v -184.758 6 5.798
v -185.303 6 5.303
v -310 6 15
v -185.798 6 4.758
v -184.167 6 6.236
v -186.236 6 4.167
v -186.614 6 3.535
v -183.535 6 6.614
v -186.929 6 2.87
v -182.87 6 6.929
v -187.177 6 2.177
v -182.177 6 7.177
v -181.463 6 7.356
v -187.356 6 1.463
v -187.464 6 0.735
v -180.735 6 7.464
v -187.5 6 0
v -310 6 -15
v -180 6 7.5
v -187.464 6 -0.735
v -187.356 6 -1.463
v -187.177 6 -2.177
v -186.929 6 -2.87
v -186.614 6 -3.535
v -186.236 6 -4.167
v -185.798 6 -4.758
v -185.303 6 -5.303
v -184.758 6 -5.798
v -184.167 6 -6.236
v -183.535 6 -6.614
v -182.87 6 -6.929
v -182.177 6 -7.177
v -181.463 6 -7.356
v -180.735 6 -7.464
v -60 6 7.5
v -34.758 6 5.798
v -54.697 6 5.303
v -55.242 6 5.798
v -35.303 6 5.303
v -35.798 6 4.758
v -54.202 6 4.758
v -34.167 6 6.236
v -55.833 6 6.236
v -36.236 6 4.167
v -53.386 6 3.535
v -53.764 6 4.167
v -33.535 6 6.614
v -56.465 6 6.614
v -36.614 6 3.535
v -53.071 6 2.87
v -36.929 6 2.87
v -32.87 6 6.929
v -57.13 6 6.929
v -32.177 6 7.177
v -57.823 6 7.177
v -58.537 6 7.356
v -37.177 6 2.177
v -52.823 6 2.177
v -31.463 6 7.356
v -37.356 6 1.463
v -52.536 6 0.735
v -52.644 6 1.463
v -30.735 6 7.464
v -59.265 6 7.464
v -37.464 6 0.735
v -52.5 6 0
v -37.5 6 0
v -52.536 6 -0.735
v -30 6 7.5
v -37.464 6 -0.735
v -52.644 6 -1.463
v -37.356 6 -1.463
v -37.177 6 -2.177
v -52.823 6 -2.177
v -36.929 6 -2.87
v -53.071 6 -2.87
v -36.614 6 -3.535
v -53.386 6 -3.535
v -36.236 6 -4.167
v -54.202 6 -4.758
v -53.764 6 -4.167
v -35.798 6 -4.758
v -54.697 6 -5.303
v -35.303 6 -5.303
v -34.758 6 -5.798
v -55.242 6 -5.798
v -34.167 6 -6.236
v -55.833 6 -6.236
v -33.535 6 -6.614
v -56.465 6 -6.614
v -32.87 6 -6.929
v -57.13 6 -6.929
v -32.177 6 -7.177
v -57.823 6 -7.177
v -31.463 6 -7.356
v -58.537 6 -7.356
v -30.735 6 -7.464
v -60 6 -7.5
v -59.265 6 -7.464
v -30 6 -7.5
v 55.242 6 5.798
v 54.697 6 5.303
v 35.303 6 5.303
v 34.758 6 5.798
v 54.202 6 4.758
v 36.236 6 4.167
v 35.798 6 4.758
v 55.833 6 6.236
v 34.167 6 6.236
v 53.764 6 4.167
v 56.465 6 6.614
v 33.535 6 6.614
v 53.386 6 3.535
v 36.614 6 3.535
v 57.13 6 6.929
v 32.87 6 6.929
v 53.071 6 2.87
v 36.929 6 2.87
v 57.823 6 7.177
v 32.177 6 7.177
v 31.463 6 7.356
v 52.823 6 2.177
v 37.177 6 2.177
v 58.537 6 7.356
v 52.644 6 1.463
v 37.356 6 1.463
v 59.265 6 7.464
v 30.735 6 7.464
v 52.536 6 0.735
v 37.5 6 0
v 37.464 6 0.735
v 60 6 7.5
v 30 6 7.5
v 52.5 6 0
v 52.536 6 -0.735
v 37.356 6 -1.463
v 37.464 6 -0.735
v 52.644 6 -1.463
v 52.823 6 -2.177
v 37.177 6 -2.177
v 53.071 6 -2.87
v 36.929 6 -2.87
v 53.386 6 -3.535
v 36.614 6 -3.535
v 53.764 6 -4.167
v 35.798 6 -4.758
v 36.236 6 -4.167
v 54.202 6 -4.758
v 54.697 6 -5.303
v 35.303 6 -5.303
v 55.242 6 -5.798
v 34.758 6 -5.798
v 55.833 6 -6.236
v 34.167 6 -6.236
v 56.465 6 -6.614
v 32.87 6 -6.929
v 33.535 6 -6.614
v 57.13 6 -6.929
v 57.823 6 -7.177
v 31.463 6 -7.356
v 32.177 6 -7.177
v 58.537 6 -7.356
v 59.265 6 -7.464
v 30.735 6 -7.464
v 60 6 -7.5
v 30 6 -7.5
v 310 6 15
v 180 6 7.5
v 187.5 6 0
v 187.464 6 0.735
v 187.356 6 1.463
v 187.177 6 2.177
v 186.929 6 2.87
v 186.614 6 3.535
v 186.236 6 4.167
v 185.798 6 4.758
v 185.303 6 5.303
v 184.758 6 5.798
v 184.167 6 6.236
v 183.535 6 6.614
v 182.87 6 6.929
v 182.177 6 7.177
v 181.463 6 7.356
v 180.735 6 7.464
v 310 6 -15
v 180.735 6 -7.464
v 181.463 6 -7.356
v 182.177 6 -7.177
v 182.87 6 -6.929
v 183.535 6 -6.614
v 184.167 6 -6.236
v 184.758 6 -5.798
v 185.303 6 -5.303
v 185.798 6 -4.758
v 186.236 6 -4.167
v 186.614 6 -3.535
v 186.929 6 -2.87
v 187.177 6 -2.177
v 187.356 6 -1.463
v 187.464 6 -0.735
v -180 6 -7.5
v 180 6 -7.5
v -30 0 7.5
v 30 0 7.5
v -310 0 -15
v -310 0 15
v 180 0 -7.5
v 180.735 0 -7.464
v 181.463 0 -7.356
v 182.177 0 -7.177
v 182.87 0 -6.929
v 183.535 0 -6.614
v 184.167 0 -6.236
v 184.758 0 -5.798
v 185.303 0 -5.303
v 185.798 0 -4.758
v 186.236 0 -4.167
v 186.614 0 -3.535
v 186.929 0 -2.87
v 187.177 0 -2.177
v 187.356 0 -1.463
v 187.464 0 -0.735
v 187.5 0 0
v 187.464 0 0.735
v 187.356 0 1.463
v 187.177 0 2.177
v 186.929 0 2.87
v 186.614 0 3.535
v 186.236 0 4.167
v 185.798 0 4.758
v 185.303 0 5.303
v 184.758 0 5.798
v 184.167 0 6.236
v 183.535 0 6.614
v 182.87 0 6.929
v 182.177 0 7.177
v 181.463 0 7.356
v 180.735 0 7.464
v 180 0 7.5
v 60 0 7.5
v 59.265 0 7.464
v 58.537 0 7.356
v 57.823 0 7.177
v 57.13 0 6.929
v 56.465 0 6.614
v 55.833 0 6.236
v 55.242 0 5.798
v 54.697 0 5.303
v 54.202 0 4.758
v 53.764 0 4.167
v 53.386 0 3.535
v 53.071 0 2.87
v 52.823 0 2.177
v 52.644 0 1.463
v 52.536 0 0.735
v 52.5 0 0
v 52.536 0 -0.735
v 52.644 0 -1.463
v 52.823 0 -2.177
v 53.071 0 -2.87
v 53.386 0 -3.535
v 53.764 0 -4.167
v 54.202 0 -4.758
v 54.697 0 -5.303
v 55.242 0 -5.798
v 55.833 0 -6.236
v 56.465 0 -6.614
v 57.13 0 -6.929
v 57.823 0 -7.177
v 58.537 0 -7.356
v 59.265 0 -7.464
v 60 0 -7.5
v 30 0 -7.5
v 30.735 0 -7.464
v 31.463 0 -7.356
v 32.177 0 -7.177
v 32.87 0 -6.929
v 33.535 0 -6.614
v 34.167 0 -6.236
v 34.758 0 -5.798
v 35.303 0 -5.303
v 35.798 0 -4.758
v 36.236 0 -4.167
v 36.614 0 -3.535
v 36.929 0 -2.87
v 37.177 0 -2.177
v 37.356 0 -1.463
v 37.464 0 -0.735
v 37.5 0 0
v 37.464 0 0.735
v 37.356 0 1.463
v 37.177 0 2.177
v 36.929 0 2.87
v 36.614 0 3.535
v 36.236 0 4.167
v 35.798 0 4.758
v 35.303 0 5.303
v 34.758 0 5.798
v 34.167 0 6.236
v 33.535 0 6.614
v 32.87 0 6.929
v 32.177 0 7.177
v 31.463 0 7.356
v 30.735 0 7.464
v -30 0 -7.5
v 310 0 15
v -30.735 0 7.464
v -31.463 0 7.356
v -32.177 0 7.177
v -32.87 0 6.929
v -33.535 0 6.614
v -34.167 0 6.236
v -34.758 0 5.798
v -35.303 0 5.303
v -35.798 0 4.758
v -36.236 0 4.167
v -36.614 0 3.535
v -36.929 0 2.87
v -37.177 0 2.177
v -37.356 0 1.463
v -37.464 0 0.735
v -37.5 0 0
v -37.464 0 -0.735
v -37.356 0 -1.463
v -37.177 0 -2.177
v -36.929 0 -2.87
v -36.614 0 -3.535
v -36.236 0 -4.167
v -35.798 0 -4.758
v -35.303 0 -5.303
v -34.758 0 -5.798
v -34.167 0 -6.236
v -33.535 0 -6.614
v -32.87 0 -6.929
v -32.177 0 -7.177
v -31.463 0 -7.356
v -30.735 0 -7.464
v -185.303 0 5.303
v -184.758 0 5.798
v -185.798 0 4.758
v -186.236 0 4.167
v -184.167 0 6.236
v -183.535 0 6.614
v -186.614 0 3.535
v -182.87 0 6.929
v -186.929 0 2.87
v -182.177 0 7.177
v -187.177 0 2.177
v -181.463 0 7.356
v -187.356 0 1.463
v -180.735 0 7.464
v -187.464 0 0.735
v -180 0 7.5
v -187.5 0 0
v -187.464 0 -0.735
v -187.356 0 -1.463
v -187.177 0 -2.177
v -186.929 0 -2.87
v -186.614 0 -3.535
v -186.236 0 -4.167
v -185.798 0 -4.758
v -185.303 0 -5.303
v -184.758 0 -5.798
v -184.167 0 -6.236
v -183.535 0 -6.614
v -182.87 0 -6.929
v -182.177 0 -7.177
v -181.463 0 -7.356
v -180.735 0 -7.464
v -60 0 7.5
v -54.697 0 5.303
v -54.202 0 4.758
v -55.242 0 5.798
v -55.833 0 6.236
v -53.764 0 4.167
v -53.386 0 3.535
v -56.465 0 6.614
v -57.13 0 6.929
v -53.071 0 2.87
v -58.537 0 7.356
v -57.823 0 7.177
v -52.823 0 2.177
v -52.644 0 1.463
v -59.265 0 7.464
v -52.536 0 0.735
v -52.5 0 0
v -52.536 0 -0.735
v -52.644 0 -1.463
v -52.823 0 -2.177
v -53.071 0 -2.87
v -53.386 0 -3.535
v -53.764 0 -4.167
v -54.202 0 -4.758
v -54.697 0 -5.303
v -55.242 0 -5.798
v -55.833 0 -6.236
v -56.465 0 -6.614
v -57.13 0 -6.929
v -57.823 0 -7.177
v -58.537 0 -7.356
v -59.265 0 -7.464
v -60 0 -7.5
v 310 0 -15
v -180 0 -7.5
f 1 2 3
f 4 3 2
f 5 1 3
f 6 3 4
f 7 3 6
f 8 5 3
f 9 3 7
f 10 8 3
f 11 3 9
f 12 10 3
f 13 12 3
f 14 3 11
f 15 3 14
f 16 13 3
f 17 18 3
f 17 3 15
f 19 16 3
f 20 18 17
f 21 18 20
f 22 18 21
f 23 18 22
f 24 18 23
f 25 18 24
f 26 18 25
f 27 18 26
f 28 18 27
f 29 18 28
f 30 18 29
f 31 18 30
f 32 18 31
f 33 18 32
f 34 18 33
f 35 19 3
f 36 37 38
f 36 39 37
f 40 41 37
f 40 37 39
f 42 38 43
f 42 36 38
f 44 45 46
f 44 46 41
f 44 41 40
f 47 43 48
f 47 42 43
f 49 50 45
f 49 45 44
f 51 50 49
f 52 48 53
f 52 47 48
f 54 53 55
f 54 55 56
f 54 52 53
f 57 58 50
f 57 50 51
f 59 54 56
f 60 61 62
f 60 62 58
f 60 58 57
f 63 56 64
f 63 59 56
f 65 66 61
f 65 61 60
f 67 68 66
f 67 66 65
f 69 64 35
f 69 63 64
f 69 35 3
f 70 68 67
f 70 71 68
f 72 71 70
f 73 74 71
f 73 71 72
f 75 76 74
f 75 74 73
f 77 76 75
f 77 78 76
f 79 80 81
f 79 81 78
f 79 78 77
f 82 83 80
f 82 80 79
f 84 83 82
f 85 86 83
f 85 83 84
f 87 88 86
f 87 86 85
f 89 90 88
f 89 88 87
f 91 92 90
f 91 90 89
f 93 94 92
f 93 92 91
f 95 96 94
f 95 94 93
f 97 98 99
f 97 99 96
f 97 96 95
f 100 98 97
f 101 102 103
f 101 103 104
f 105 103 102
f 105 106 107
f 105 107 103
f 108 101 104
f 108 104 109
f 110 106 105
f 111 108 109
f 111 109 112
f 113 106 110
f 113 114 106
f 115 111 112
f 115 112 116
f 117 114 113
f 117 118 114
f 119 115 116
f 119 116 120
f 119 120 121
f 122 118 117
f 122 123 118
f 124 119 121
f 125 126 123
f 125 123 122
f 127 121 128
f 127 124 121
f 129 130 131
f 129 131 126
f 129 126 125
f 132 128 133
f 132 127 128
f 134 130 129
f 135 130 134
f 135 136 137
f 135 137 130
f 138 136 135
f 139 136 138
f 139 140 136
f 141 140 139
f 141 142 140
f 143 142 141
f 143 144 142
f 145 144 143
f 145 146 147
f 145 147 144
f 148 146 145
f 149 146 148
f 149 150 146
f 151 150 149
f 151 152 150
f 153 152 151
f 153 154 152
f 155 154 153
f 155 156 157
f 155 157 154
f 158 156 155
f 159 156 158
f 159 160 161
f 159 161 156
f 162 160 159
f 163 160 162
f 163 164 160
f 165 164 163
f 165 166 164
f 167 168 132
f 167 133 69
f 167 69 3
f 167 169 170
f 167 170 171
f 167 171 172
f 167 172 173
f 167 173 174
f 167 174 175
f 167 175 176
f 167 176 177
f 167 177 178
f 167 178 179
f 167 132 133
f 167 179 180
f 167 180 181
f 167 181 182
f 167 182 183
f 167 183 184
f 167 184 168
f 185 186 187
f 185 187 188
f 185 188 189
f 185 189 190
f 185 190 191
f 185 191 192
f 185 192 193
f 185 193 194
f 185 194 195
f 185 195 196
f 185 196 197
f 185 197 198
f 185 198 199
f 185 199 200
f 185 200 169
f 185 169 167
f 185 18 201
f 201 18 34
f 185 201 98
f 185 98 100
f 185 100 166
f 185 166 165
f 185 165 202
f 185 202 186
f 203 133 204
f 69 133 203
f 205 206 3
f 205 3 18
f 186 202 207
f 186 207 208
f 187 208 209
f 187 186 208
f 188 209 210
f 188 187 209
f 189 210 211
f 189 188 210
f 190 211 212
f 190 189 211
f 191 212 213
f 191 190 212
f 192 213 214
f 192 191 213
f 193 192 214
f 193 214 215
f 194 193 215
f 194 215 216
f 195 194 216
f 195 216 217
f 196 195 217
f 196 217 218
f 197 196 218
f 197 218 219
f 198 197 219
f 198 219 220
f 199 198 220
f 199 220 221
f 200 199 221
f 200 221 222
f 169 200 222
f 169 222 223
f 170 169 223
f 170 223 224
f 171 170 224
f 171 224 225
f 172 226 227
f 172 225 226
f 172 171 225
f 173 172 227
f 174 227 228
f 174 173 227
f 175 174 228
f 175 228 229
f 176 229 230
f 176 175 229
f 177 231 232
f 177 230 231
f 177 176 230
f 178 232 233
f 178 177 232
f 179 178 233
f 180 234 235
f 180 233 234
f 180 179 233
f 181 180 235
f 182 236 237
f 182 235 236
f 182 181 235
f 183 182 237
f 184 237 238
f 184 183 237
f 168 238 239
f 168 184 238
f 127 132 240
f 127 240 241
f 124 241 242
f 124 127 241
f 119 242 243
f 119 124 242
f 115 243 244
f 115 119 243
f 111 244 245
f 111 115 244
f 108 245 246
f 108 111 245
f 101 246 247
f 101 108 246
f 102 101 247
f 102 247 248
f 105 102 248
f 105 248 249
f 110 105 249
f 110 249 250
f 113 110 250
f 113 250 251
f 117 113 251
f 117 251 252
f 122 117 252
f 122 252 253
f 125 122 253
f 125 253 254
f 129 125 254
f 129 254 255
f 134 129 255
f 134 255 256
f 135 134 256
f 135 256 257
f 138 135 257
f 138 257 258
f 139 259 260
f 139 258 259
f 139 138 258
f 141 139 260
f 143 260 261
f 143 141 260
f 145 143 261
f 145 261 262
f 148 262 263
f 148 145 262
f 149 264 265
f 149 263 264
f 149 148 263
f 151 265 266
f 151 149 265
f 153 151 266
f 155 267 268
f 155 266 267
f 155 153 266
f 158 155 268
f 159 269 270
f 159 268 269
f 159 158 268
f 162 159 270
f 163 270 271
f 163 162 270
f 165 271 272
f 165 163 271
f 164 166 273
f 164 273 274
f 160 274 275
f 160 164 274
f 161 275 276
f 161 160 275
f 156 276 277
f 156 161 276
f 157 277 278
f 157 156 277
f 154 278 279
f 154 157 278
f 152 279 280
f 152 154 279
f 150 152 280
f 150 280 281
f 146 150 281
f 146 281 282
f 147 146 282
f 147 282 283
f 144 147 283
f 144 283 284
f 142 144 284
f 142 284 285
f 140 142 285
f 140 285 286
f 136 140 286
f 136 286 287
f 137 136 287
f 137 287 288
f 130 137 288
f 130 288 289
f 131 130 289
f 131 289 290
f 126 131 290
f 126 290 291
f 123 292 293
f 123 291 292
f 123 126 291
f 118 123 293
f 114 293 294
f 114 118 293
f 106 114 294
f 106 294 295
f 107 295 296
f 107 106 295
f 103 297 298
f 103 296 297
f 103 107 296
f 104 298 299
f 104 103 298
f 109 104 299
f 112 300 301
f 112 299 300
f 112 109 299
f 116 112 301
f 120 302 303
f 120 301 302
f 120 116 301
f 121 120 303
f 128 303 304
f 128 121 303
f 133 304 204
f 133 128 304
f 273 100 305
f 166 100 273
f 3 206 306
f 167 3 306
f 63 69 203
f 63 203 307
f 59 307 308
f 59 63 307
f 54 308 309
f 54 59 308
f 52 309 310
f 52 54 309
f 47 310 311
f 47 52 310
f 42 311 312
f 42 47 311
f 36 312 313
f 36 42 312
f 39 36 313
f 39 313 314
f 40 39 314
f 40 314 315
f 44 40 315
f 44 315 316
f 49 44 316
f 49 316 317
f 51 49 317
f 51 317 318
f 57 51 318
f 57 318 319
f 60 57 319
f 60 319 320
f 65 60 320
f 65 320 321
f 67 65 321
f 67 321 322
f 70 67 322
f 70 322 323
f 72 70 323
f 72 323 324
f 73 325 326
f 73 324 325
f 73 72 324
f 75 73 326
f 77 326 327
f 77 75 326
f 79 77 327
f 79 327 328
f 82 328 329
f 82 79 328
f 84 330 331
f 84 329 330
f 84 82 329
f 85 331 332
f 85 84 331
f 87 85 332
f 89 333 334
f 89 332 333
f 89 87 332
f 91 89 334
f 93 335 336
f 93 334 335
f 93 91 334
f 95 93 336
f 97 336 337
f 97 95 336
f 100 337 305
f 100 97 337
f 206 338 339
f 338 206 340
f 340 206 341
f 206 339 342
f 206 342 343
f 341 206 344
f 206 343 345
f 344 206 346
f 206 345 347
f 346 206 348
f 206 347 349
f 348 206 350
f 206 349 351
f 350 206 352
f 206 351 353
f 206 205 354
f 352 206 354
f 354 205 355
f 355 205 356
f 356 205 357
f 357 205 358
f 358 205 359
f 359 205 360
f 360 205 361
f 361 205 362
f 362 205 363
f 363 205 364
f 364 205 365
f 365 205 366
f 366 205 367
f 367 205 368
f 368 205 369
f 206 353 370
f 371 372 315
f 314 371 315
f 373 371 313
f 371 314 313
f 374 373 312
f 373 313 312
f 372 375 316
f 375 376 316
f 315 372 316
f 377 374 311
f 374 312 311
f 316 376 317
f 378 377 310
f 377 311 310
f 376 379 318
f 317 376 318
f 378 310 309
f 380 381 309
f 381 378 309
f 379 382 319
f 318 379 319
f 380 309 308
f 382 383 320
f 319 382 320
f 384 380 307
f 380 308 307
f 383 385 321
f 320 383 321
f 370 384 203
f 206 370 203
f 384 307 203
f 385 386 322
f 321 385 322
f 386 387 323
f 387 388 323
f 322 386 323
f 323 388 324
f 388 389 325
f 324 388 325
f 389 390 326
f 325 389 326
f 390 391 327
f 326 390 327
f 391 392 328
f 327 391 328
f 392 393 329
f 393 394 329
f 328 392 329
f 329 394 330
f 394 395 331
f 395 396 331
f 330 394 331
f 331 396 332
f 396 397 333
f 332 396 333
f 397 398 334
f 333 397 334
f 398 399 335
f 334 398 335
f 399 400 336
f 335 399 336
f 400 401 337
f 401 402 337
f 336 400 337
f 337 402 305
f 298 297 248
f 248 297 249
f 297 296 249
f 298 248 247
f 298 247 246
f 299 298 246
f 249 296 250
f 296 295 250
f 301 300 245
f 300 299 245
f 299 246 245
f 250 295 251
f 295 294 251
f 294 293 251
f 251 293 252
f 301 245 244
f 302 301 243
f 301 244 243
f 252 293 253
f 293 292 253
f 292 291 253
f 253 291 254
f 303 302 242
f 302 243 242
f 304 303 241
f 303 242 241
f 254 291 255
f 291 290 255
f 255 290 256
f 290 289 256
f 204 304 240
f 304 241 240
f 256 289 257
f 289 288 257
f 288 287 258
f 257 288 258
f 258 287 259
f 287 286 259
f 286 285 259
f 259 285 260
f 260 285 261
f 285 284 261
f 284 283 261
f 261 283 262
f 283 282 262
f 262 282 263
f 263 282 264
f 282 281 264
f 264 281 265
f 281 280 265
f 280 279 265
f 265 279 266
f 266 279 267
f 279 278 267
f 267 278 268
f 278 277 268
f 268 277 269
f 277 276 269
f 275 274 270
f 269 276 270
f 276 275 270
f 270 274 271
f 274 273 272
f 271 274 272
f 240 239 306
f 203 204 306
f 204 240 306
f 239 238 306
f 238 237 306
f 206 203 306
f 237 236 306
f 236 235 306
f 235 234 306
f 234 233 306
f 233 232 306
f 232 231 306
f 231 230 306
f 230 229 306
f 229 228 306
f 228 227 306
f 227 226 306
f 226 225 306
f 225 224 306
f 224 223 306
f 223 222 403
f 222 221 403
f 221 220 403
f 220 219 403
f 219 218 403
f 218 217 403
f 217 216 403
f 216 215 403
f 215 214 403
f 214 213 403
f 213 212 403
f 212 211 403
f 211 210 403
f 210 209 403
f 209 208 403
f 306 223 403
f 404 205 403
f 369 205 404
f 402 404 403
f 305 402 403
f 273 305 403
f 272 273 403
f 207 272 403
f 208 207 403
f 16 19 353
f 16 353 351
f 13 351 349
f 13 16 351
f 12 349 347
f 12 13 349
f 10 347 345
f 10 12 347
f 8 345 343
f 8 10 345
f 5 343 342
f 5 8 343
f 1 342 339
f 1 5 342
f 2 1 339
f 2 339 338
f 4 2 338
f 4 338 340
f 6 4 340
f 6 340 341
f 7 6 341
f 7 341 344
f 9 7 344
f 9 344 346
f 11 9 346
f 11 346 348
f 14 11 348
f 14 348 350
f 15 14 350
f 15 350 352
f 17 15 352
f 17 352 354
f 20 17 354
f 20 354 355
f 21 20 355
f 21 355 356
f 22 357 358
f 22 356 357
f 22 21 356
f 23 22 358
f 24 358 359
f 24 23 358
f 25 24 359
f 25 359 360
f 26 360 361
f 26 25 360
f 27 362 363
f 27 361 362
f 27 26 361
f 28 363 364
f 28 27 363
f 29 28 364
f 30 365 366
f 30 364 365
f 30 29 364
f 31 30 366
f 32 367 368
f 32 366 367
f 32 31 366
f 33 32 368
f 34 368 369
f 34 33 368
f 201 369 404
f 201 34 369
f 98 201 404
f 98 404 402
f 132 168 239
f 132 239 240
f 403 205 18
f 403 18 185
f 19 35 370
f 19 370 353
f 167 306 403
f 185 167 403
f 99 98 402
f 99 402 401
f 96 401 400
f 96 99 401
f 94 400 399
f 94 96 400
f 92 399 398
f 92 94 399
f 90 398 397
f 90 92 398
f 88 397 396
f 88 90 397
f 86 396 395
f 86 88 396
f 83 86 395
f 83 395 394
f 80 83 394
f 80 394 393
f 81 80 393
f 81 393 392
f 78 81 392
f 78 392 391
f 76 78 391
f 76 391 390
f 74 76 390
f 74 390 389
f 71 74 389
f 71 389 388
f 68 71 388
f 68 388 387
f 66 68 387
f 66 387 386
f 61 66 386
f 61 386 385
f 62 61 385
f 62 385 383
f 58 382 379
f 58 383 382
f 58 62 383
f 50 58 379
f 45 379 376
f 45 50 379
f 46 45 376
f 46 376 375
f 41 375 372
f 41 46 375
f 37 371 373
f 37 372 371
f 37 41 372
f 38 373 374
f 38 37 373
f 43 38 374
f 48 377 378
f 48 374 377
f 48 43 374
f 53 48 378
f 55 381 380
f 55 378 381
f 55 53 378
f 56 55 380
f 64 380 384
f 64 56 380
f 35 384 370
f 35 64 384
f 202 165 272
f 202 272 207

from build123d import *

# Parameters (mm, degrees)
SKETCH_1_W          = 620
SKETCH_1_H          = 30
EXTRUDE_1_DEPTH     = 6
CUT_EXTRUDE_1_DEPTH = 311.420682301


with BuildPart() as part:
    # 草图1 → 凸台-拉伸1 (new body)
    with BuildSketch(Plane(origin=(0, 0, 0), x_dir=(1, 0, 0), z_dir=(0, 1, 0))):
        Rectangle(SKETCH_1_W, SKETCH_1_H)
    extrude(amount=EXTRUDE_1_DEPTH)

    # 草图2 → 切除-拉伸1 (cut, through all)
    with BuildSketch(Plane(origin=(0, 6, 0), x_dir=(1, 0, 0), z_dir=(0, 1, 0))):
        with BuildLine():
            Line((30, -7.5), (-30, -7.5))
            ThreePointArc((-30, -7.5), (-37.5, 0), (-30, 7.5))
            Line((-30, 7.5), (30, 7.5))
            ThreePointArc((30, 7.5), (37.5, 0), (30, -7.5))
        make_face()
        with BuildLine():
            Line((-60, -7.5), (-180, -7.5))
            ThreePointArc((-180, -7.5), (-187.5, 0), (-180, 7.5))
            Line((-180, 7.5), (-60, 7.5))
            ThreePointArc((-60, 7.5), (-52.5, 0), (-60, -7.5))
        make_face()
        with BuildLine():
            Line((60, 7.5), (180, 7.5))
            ThreePointArc((180, 7.5), (187.5, 0), (180, -7.5))
            Line((180, -7.5), (60, -7.5))
            ThreePointArc((60, -7.5), (52.5, 0), (60, 7.5))
        make_face()
    extrude(amount=-CUT_EXTRUDE_1_DEPTH, mode=Mode.SUBTRACT)


solid = part.part
